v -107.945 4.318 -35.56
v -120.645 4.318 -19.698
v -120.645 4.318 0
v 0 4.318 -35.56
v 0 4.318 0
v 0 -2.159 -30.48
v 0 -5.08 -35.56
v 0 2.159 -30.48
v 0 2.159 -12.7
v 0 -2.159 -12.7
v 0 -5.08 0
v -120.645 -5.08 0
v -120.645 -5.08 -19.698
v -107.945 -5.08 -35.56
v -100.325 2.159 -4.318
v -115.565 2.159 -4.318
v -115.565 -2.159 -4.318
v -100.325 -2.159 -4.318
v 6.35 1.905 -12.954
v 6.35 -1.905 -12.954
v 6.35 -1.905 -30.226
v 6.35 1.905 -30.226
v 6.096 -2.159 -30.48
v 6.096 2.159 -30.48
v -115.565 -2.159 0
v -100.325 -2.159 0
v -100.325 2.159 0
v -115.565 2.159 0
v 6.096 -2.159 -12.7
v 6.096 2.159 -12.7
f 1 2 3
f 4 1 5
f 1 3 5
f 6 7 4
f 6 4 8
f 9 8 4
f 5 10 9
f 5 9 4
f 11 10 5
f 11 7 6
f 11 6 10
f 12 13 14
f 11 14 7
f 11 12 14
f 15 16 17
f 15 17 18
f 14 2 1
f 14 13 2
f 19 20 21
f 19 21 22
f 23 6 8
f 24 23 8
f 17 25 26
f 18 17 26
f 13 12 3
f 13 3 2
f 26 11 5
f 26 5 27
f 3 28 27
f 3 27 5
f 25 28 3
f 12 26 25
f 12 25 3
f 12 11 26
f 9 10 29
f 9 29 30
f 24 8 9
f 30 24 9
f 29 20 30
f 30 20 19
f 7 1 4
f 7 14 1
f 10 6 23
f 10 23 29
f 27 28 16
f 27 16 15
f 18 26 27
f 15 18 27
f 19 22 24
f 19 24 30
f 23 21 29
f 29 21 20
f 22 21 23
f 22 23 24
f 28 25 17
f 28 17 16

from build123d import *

# Parameters (mm, degrees)
F1_DEPTH      = 5.08
F1_DEPTH_BACK = 4.318
F2_W          = 4.318
F2_H          = 17.78
F3_DEPTH      = 6.35
F4_W          = 15.24
F4_H          = 4.318
F5_DEPTH      = 4.318
F6_SIZE       = 0.254


with BuildPart() as f1:
    # F0 (on Front) → F1 (new body, two sides)
    with BuildSketch(Plane.XZ) as f1_sk:
        Polygon((0, -35.56), (0, 0), (-120.645046, 0), (-120.645046, -19.697705), (-107.945046, -35.56), align=None)
    extrude(amount=F1_DEPTH)
    extrude(f1_sk.sketch, amount=-F1_DEPTH_BACK)

    # F2 (on face) → F3 (join)
    with BuildSketch(Plane.YZ):
        with Locations((0, -21.59)):
            Rectangle(F2_W, F2_H)
    extrude(amount=F3_DEPTH)

    # F4 (on face) → F5 (cut)
    with BuildSketch(Plane.XY):
        with Locations((-107.945046, 0)):
            Rectangle(F4_W, F4_H)
    extrude(amount=-F5_DEPTH, mode=Mode.SUBTRACT)

    # F6
    f6_edges = [f1.edges().sort_by_distance(p)[0] for p in [
        (6.35, 0, -12.7),
        (6.35, -2.159, -21.59),
        (6.35, 0, -30.48),
        (6.35, 2.159, -21.59),
    ]]
    chamfer(f6_edges, length=F6_SIZE)


solid = f1.part
